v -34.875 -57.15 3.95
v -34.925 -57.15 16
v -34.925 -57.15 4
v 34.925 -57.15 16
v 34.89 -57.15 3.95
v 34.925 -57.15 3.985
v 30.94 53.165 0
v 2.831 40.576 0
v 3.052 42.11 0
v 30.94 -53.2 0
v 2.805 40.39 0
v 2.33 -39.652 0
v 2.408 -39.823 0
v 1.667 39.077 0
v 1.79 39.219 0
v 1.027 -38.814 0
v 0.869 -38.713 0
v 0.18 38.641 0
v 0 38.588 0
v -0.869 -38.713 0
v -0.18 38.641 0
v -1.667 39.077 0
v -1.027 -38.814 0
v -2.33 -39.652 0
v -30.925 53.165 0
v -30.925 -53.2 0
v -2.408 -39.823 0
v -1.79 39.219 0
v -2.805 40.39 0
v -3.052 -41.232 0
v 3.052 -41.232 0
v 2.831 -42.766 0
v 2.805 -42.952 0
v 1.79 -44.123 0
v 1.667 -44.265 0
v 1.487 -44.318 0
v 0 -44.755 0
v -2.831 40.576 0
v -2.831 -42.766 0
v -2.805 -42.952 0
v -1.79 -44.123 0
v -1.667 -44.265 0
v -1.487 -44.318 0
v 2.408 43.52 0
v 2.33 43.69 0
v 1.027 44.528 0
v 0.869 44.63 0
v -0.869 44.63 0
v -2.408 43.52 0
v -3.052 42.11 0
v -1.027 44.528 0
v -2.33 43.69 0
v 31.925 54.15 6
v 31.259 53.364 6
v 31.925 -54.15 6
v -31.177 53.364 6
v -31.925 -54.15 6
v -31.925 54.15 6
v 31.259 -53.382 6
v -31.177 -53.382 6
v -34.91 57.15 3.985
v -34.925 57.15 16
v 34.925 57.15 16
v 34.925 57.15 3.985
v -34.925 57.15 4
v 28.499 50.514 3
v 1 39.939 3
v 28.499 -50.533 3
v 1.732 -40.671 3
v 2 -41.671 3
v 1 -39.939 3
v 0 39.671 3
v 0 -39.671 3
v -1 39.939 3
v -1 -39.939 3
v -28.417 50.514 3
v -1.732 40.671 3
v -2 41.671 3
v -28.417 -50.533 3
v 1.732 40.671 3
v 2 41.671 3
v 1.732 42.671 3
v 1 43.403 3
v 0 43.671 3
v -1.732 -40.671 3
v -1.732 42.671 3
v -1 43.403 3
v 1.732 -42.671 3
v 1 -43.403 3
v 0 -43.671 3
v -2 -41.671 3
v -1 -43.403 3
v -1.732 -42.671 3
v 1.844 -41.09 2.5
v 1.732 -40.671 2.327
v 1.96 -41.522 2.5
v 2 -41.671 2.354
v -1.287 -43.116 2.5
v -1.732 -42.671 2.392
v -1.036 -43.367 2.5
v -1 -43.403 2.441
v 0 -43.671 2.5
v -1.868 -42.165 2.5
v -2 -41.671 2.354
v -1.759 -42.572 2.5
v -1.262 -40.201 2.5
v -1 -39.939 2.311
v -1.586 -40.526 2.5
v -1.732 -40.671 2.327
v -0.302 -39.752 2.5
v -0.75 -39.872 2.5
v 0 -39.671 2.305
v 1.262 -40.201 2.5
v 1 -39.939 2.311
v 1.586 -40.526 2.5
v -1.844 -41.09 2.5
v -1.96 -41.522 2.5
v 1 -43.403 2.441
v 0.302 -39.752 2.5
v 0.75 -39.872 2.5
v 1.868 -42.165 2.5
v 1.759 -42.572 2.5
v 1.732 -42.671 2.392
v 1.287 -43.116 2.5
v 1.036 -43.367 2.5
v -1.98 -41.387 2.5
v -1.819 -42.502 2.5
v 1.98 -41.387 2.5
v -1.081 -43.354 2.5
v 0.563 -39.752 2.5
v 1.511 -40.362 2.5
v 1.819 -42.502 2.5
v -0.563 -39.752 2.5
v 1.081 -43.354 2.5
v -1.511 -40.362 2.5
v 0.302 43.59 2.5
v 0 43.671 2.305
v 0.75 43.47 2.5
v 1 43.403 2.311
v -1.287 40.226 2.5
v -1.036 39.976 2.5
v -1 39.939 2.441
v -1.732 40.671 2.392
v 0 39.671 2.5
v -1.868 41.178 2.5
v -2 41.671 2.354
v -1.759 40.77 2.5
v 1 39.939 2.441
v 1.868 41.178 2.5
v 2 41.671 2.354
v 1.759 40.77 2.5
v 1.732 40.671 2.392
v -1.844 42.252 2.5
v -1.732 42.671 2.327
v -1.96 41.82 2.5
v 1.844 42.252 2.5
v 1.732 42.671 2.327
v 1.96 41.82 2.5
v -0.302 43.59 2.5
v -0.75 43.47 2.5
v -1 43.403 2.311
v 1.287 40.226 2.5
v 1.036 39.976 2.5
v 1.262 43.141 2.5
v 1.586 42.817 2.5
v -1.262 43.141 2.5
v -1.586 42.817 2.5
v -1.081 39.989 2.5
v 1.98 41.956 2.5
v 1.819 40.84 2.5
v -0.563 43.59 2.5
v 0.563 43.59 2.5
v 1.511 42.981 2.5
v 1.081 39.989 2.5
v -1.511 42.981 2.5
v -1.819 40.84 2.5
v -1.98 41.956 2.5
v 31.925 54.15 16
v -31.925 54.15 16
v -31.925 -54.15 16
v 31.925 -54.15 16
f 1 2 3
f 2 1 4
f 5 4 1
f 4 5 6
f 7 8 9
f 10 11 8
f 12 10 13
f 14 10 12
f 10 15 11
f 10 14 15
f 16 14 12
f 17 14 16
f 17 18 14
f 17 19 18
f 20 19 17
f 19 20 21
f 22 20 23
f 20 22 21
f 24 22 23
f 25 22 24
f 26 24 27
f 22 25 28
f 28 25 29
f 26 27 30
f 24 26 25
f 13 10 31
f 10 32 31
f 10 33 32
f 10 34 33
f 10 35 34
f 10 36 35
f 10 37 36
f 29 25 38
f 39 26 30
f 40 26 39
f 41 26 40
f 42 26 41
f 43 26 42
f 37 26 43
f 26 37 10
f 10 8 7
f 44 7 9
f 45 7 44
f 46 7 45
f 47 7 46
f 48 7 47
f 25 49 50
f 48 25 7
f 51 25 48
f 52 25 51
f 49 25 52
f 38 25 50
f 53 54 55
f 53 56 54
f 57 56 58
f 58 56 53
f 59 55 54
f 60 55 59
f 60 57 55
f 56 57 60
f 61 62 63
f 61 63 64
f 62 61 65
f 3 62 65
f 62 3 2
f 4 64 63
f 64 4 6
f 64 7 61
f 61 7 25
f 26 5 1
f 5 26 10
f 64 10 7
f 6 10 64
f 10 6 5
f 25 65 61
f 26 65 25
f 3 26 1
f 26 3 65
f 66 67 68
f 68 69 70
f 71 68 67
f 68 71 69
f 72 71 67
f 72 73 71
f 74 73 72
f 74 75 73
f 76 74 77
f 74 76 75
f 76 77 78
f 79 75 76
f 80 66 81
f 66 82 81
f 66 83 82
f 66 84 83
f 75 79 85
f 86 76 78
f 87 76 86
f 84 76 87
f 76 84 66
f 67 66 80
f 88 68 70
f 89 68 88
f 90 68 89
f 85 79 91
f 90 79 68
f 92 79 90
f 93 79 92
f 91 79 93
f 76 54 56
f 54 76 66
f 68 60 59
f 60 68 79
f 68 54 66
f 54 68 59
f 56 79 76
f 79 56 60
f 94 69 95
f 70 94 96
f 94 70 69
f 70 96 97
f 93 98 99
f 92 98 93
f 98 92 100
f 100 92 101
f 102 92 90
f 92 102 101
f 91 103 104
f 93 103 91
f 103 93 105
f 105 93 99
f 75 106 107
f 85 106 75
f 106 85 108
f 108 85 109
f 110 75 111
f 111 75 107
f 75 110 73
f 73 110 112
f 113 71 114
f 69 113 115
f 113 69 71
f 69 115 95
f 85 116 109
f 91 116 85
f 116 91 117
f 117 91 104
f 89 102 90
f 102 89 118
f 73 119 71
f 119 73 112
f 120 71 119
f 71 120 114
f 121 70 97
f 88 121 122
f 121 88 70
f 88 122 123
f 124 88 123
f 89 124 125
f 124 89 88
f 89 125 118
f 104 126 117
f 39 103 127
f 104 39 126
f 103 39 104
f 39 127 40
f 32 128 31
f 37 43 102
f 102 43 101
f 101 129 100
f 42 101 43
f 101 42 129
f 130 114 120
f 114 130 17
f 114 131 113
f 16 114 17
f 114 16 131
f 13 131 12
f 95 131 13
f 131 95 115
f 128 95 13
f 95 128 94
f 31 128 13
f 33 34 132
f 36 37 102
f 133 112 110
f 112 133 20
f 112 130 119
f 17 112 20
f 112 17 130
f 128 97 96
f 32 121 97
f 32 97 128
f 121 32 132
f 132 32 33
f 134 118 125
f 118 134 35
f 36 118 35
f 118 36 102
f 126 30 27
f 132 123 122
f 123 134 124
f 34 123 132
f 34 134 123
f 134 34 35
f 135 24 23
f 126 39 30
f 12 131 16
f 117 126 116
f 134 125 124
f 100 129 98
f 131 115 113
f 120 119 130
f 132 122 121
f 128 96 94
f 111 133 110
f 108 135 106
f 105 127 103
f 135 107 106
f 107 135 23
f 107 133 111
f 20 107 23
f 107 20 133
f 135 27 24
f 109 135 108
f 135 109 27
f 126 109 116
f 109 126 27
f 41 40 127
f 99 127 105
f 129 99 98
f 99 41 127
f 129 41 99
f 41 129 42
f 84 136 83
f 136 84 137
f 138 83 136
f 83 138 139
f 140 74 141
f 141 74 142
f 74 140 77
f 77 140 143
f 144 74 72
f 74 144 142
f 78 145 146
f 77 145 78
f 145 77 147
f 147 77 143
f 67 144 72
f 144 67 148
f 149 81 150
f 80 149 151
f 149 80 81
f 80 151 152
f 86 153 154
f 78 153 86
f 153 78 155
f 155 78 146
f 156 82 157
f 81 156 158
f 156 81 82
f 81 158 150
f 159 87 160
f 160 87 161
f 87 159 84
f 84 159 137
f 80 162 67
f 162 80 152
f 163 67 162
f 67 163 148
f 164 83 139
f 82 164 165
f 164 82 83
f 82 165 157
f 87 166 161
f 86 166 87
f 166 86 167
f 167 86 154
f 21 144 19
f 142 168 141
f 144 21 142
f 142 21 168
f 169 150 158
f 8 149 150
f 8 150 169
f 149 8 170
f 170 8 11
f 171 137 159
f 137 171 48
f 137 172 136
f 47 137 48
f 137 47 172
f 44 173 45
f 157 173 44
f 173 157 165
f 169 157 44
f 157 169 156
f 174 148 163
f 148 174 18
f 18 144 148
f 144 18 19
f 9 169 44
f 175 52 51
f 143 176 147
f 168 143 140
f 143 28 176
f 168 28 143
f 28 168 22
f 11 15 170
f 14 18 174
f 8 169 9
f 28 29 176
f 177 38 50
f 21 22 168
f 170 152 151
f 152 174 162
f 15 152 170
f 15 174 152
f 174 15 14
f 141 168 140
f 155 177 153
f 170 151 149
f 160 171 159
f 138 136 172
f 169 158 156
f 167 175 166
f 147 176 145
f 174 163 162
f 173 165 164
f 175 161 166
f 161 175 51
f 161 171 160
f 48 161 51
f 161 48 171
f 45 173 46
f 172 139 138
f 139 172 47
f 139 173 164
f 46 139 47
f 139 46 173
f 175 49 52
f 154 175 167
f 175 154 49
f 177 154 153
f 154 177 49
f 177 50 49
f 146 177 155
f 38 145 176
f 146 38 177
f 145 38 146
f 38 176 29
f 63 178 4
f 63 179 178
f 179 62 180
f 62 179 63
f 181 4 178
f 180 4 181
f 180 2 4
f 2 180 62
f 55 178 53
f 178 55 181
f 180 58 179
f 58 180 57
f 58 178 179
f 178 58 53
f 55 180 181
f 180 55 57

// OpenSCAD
// [FL_INDEX: keywords="openscad, 3d_parametric, Wally_with_extra_depth, csg_solid" | COT="Parametric OpenSCAD design from 3DCodeverse"]
// Title: Wally with extra depth

// WALLY - Wall Plate Customizer v1.3
// by TheNewHobbyist 2013 (http://thenewhobbyist.com)
// http://www.thingiverse.com/thing:47956
//
// Most of the connectors used with this thing are panel mount connectors from
// www.DataPro.net I can't vouch for their quality but they did have easy to
// find dimensions for their products so I used them.
//
// This could be tightened up considerably but I thought I'd get it out there for people
// to experiment with before I lose my mind staring at it too long. Also this is my
// first OpenSCAD model so cut me some slack ;)
//
//   Notes:
//
// * The plug types "Duplex Outlet", "Long_Toggle Switch", "Toggle Switch", and "Rocker"
//   will all use the entire plate when selected in top or bottom configuration. The
//   other selection (if not "none" will be selected.
//
// * "None" and "Blank should not be considered equal. if "None" is selected for one of
//   the two holes on a plate the other selection will be centered on that plate. If
//   "Blank" is selected that plug location will remain blank but the other selection
//   will NOT move into a centered position.
//
//	Change Log:
//
//	v1.1
//	UPDATED: Screw hole locations for designer and toggle plate types.
//	UPDATED: Hole size for designer plate type.
//	UPDATED: Outlet hole spacing
//
//	v1.2
//	ADDED: Long Toggle Switch for laird
//
//	v1.3
//	ADDED: 3 new sizes for plate export: Standard, Junior-Jumbo, and Jumbo.
//

  //////////////////////////
 // Customizer Settings: //
//////////////////////////

//How big are we talkin' here?
plate_width = 1; //	[1:5]

// Bigger hole in your wall? Try this
plate_size = 0; // [0:Standard, 1:Junior-Jumbo, 2:Jumbo]

//Pick a plug or full plate type
1st_plate = "none";  //	["none":None, "blank":Blank Port, "toggle":Full Plate - Toggle Switch, "long_toggle":Full Plate - Long Toggle Switch, "outlet":Full Plate - Duplex Outlet, "rocker":Full Plate - Rocker/Designer Plate, "keystone1":Keystone Jack, "vga":VGA Port, "hdmi":HDMI Port, "dvi":DVI-I Port, "displayport":Displayport, "cat5e":Cat5e/Cat6 Port, "usb-a":USB-A Port, "usb-b":USB-B Port, "firewire":Firewire IEEE 1394 Port, "db09":DB-09 Port, "ps2":PS2 Port, "f-type": F-Type/Coaxial Port,"svideo":S-Video Port, "stereo":Stereo Headphone Jack]
//Pick a bottom plug type or leave as none
1st_plate_bottom_hole = "none";  //	["none":None, "blank":Blank Port, "keystone1":Keystone Jack, "vga":VGA Port, "hdmi":HDMI Port, "dvi":DVI-I Port, "displayport":Displayport, "cat5e":Cat5e/Cat6 Port, "usb-a":USB-A Port, "usb-b":USB-B Port, "firewire":Firewire IEEE 1394 Port, "db09":DB-09 Port, "ps2":PS2 Port, "f-type": F-Type/Coaxial Port,"svideo":S-Video Port, "stereo":Stereo Headphone Jack]
//Pick a plug or full plate type
2nd_plate = "none";  //	["none":None, "blank":Blank Port, "toggle":Full Plate - Toggle Switch, "long_toggle":Full Plate - Long Toggle Switch, "outlet":Full Plate - Duplex Outlet, "rocker":Full Plate - Rocker/Designer Plate, "keystone1":Keystone Jack, "vga":VGA Port, "hdmi":HDMI Port, "dvi":DVI-I Port, "displayport":Displayport, "cat5e":Cat5e/Cat6 Port, "usb-a":USB-A Port, "usb-b":USB-B Port, "firewire":Firewire IEEE 1394 Port, "db09":DB-09 Port, "ps2":PS2 Port, "f-type": F-Type/Coaxial Port,"svideo":S-Video Port, "stereo":Stereo Headphone Jack]
//Pick a bottom plug type or leave as none
2nd_plate_bottom_hole = "none";  //	["none":None, "blank":Blank Port, "keystone1":Keystone Jack, "vga":VGA Port, "hdmi":HDMI Port, "dvi":DVI-I Port, "displayport":Displayport, "cat5e":Cat5e/Cat6 Port, "usb-a":USB-A Port, "usb-b":USB-B Port, "firewire":Firewire IEEE 1394 Port, "db09":DB-09 Port, "ps2":PS2 Port, "f-type": F-Type/Coaxial Port,"svideo":S-Video Port, "stereo":Stereo Headphone Jack]
//Pick a plug or full plate type
3rd_plate = "none";  //	["none":None, "blank":Blank Port, "toggle":Full Plate - Toggle Switch, "long_toggle":Full Plate - Long Toggle Switch, "outlet":Full Plate - Duplex Outlet, "rocker":Full Plate - Rocker/Designer Plate, "keystone1":Keystone Jack, "vga":VGA Port, "hdmi":HDMI Port, "dvi":DVI-I Port, "displayport":Displayport, "cat5e":Cat5e/Cat6 Port, "usb-a":USB-A Port, "usb-b":USB-B Port, "firewire":Firewire IEEE 1394 Port, "db09":DB-09 Port, "ps2":PS2 Port, "f-type": F-Type/Coaxial Port,"svideo":S-Video Port, "stereo":Stereo Headphone Jack]
//Pick a bottom plug type or leave as none
3rd_plate_bottom_hole = "none";  //	["none":None, "blank":Blank Port, "keystone1":Keystone Jack, "vga":VGA Port, "hdmi":HDMI Port, "dvi":DVI-I Port, "displayport":Displayport, "cat5e":Cat5e/Cat6 Port, "usb-a":USB-A Port, "usb-b":USB-B Port, "firewire":Firewire IEEE 1394 Port, "db09":DB-09 Port, "ps2":PS2 Port, "f-type": F-Type/Coaxial Port,"svideo":S-Video Port, "stereo":Stereo Headphone Jack]
//Pick a plug or full plate type
4th_plate = "none";  //["none":None, "blank":Blank Port, "toggle":Full Plate - Toggle Switch, "long_toggle":Full Plate - Long Toggle Switch, "outlet":Full Plate - Duplex Outlet, "rocker":Full Plate - Rocker/Designer Plate, "keystone1":Keystone Jack, "vga":VGA Port, "hdmi":HDMI Port, "dvi":DVI-I Port, "displayport":Displayport, "cat5e":Cat5e/Cat6 Port, "usb-a":USB-A Port, "usb-b":USB-B Port, "firewire":Firewire IEEE 1394 Port, "db09":DB-09 Port, "ps2":PS2 Port, "f-type": F-Type/Coaxial Port,"svideo":S-Video Port, "stereo":Stereo Headphone Jack]
//Pick a bottom plug type or leave as none
4th_plate_bottom_hole = "none";  //	["none":None, "blank":Blank Port, "keystone1":Keystone Jack, "vga":VGA Port, "hdmi":HDMI Port, "dvi":DVI-I Port, "displayport":Displayport, "cat5e":Cat5e/Cat6 Port, "usb-a":USB-A Port, "usb-b":USB-B Port, "firewire":Firewire IEEE 1394 Port, "db09":DB-09 Port, "ps2":PS2 Port, "f-type": F-Type/Coaxial Port,"svideo":S-Video Port, "stereo":Stereo Headphone Jack]
//Pick a plug or full plate type
5th_plate = "none";  //["none":None, "blank":Blank Port, "toggle":Full Plate - Toggle Switch, "long_toggle":Full Plate - Long Toggle Switch, "outlet":Full Plate - Duplex Outlet, "rocker":Full Plate - Rocker/Designer Plate, "keystone1":Keystone Jack, "vga":VGA Port, "hdmi":HDMI Port, "dvi":DVI-I Port, "displayport":Displayport, "cat5e":Cat5e/Cat6 Port, "usb-a":USB-A Port, "usb-b":USB-B Port, "firewire":Firewire IEEE 1394 Port, "db09":DB-09 Port, "ps2":PS2 Port, "f-type": F-Type/Coaxial Port,"svideo":S-Video Port, "stereo":Stereo Headphone Jack]
//Pick a bottom plug type or leave as none
5th_plate_bottom_hole = "none";  //	["none":None, "blank":Blank Port, "keystone1":Keystone Jack, "vga":VGA Port, "hdmi":HDMI Port, "dvi":DVI-I Port, "displayport":Displayport, "cat5e":Cat5e/Cat6 Port, "usb-a":USB-A Port, "usb-b":USB-B Port, "firewire":Firewire IEEE 1394 Port, "db09":DB-09 Port, "ps2":PS2 Port, "f-type": F-Type/Coaxial Port,"svideo":S-Video Port, "stereo":Stereo Headphone Jack]

//Extra Amount that plate extends from wall (useful for shallow boxes)
plate_sticks_out = 10; // [0-40]
//Wall thickness for plate extension
sticks_out_thick = 3; // [2-4]

  //////////////////////
 // Static Settings: //
//////////////////////

module GoAwayCustomizer() {
// This module is here to stop Customizer from picking up the variables below
}

l_offset = [34.925,39.6875,44.45];
r_offset = [34.925,39.6875,44.45];
spacer = [0,0,46.0375,92.075,138.1125,184.15];
solid_plate_width = l_offset[plate_size] + spacer[plate_width] + r_offset[plate_size];

height_sizes = [114.3,123.825,133.35];

height = 114.3; //plate height (static)
gang_width=[0,69.86,115.824,161.925,206.375,254]; // Plate widths (standard)

edgewidth = solid_plate_width + 10; // Bevel setting for top and bottom
rightbevel = solid_plate_width - 4; // Bevel for right side (scales)

left_offset = 34.925; // Offset first hole position
switch_offset = 46.0375; // Offset all additional holes
thinner_offset=[0,0.92,0.95,0.96,0.97,0.973]; // Manual fix for right side wackiness

positions=[height_sizes[plate_size]/2,height_sizes[plate_size]/2 - 14.25,height_sizes[plate_size]/2 + 14.25];

// preview[view:north, tilt:bottom]


  ///////////////////
 // Hole Control: //
///////////////////

module plate1(){
	if (1st_plate == "toggle" || 1st_plate_bottom_hole == "toggle"){
		translate([0,l_offset[plate_size],0]) toggle_screws();
		translate([0,l_offset[plate_size],0]) hole("toggle");
		}
	else if (1st_plate == "long_toggle" || 1st_plate_bottom_hole == "long_toggle"){
		translate([0,l_offset[plate_size],0]) toggle_screws();
		translate([0,l_offset[plate_size],0]) hole("long_toggle");
		}
	else if (1st_plate == "rocker" || 1st_plate_bottom_hole == "rocker"){
		translate([0,l_offset[plate_size],0]) rocker_screws();
		translate([0,l_offset[plate_size],0]) hole("rocker");
		}
	else if (1st_plate == "outlet" || 1st_plate_bottom_hole == "outlet") {
	translate([0,l_offset[plate_size],0]) hole("outlet");
	}
	else if (1st_plate_bottom_hole == "none") {
		translate([0,l_offset[plate_size],0]) box_screws();
		translate([positions[0],l_offset[plate_size],0]) hole(1st_plate);
			}
	else if (1st_plate == "none") {
		translate([0,l_offset[plate_size],0]) box_screws();
		translate([positions[0],l_offset[plate_size],0]) hole(1st_plate_bottom_hole);
			}
	else {
	translate([0,l_offset[plate_size],0]) box_screws();
	translate([positions[1],l_offset[plate_size],0]) hole(1st_plate);
	translate([positions[2],l_offset[plate_size],0]) hole(1st_plate_bottom_hole);
	}
}

module plate2(){
	if (2nd_plate == "toggle" || 2nd_plate_bottom_hole == "toggle"){
		translate([0,l_offset[plate_size] + switch_offset,0]) toggle_screws();
		translate([0,l_offset[plate_size] + switch_offset,0]) hole("toggle");
		}
	else if (2nd_plate == "long_toggle" || 2nd_plate_bottom_hole == "long_toggle"){
		translate([0,l_offset[plate_size] + switch_offset,0]) toggle_screws();
		translate([0,l_offset[plate_size] + switch_offset,0]) hole("long_toggle");
		}
	else if (2nd_plate == "rocker" || 2nd_plate_bottom_hole == "rocker"){
		translate([0,l_offset[plate_size] + switch_offset,0]) rocker_screws();
		translate([0,l_offset[plate_size] + switch_offset,0]) hole("rocker");
		}
	else if (2nd_plate == "outlet" || 2nd_plate_bottom_hole == "outlet") {
	translate([0,l_offset[plate_size] + switch_offset,0]) hole("outlet");
	}
	else if (2nd_plate_bottom_hole == "none") {
		translate([0,l_offset[plate_size] + switch_offset,0]) box_screws();
		translate([positions[0],l_offset[plate_size] + switch_offset,0]) hole(2nd_plate);
			}
	else if (2nd_plate == "none") {
		translate([0,l_offset[plate_size] + switch_offset,0]) box_screws();
		translate([positions[0],l_offset[plate_size] + switch_offset,0]) hole(2nd_plate_bottom_hole);
			}
	else {
	translate([0,l_offset[plate_size] + switch_offset,0]) box_screws();
	translate([positions[1],l_offset[plate_size] + switch_offset,0]) hole(2nd_plate);
	translate([positions[2],l_offset[plate_size] + switch_offset,0]) hole(2nd_plate_bottom_hole);
	}
}

module plate3(){
	if (3rd_plate == "toggle" || 3rd_plate_bottom_hole == "toggle"){
		translate([0,l_offset[plate_size] + switch_offset * 2,0]) toggle_screws();
		translate([0,l_offset[plate_size] + switch_offset * 2,0]) hole("toggle");
		}
	else if (3rd_plate == "long_toggle" || 3rd_plate_bottom_hole == "long_toggle"){
		translate([0,l_offset[plate_size] + switch_offset * 2,0]) toggle_screws();
		translate([0,l_offset[plate_size] + switch_offset * 2,0]) hole("long_toggle");
		}
	else if (3rd_plate == "rocker" || 3rd_plate_bottom_hole == "rocker"){
		translate([0,l_offset[plate_size] + switch_offset * 2,0]) rocker_screws();
		translate([0,l_offset[plate_size] + switch_offset * 2,0]) hole("rocker");
		}
	else if (3rd_plate == "outlet" || 3rd_plate_bottom_hole == "outlet") {
	translate([0,l_offset[plate_size] + switch_offset * 2,0]) hole("outlet");
	}
	else if (3rd_plate_bottom_hole == "none") {
		translate([0,l_offset[plate_size] + switch_offset * 2,0]) box_screws();
		translate([positions[0],l_offset[plate_size] + switch_offset * 2,0]) hole(3rd_plate);
			}
	else if (3rd_plate == "none") {
		translate([0,l_offset[plate_size] + switch_offset * 2,0]) box_screws();
		translate([positions[0],l_offset[plate_size] + switch_offset * 2,0]) hole(3rd_plate_bottom_hole);
			}
	else {
	translate([0,l_offset[plate_size] + switch_offset * 2,0]) box_screws();
	translate([positions[1],l_offset[plate_size] + switch_offset * 2,0]) hole(3rd_plate);
	translate([positions[2],l_offset[plate_size] + switch_offset * 2,0]) hole(3rd_plate_bottom_hole);
	}
}

module plate4(){
	if (4th_plate == "toggle" || 4th_plate_bottom_hole == "toggle"){
		translate([0,l_offset[plate_size] + switch_offset * 3,0]) toggle_screws();
		translate([0,l_offset[plate_size] + switch_offset * 3,0]) hole("toggle");
		}
	else if (4th_plate == "long_toggle" || 4th_plate_bottom_hole == "long_toggle"){
		translate([0,l_offset[plate_size] + switch_offset * 3,0]) toggle_screws();
		translate([0,l_offset[plate_size] + switch_offset * 3,0]) hole("long_toggle");
		}
	else if (4th_plate == "rocker" || 4th_plate_bottom_hole == "rocker"){
		translate([0,l_offset[plate_size] + switch_offset * 3,0]) rocker_screws();
		translate([0,l_offset[plate_size] + switch_offset * 3,0]) hole("rocker");
		}
	else if (4th_plate == "outlet" || 4th_plate_bottom_hole == "outlet") {
	translate([0,l_offset[plate_size] + switch_offset * 3,0]) hole("outlet");
	}
	else if (4th_plate_bottom_hole == "none") {
		translate([0,l_offset[plate_size] + switch_offset * 3,0]) box_screws();
		translate([positions[0],l_offset[plate_size] + switch_offset * 3,0]) hole(4th_plate);
			}
	else if (4th_plate == "none") {
		translate([0,l_offset[plate_size] + switch_offset * 3,0]) box_screws();
		translate([positions[0],l_offset[plate_size] + switch_offset * 3,0]) hole(4th_plate_bottom_hole);
			}
	else {
	translate([0,l_offset[plate_size] + switch_offset * 3,0]) box_screws();
	translate([positions[1],l_offset[plate_size] + switch_offset * 3,0]) hole(4th_plate);
	translate([positions[2],l_offset[plate_size] + switch_offset * 3,0]) hole(4th_plate_bottom_hole);
	}
}

module plate5(){
	if (5th_plate == "toggle" || 5th_plate_bottom_hole == "toggle"){
		translate([0,l_offset[plate_size] + switch_offset * 4,0]) toggle_screws();
		translate([0,l_offset[plate_size] + switch_offset * 4,0]) hole("toggle");
		}
	else if (5th_plate == "long_toggle" || 5th_plate_bottom_hole == "long_toggle"){
		translate([0,l_offset[plate_size] + switch_offset * 4,0]) toggle_screws();
		translate([0,l_offset[plate_size] + switch_offset * 4,0]) hole("long_toggle");
		}
	else if (5th_plate == "rocker" || 5th_plate_bottom_hole == "rocker"){
		translate([0,l_offset[plate_size] + switch_offset * 4,0]) rocker_screws();
		translate([0,l_offset[plate_size] + switch_offset * 4,0]) hole("rocker");
		}
	else if (5th_plate == "outlet" || 5th_plate_bottom_hole == "outlet") {
	translate([0,l_offset[plate_size] + switch_offset * 4,0]) hole("outlet");
	}
	else if (5th_plate_bottom_hole == "none") {
		translate([0,l_offset[plate_size] + switch_offset * 4,0]) box_screws();
		translate([positions[0],l_offset[plate_size] + switch_offset * 4,0]) hole(5th_plate);
			}
	else if (5th_plate == "none") {
		translate([0,l_offset[plate_size] + switch_offset * 4,0]) box_screws();
		translate([positions[0],l_offset[plate_size] + switch_offset * 4,0]) hole(5th_plate_bottom_hole);
			}
	else {
	translate([0,l_offset[plate_size] + switch_offset * 4,0]) box_screws();
	translate([positions[1],l_offset[plate_size] + switch_offset * 4,0]) hole(5th_plate);
	translate([positions[2],l_offset[plate_size] + switch_offset * 4,0]) hole(5th_plate_bottom_hole);
	}
}

  /////////////////
 // SolidWorks: //
/////////////////

module extend_box() { union () {
	translate([0,0,-plate_sticks_out]) cube([height_sizes[plate_size],sticks_out_thick,plate_sticks_out]);
	translate([0,solid_plate_width-sticks_out_thick,-plate_sticks_out]) cube([height_sizes[plate_size],sticks_out_thick,plate_sticks_out]);
	translate([0,0,-plate_sticks_out]) cube([sticks_out_thick,solid_plate_width,plate_sticks_out]);
	translate([height_sizes[plate_size]-sticks_out_thick,0,-plate_sticks_out]) cube([sticks_out_thick,solid_plate_width,plate_sticks_out]);
    }
}
	    
	    module plate1_solid(){
if (1st_plate == "keystone1" && 1st_plate_bottom_hole == "none") {
	translate([height_sizes[plate_size]/2 + 14.3,l_offset[plate_size] - 11.5,-3.9]) hole("keystone_solid");
	}
else if (1st_plate == "keystone1" && 1st_plate_bottom_hole != "outlet" && 1st_plate_bottom_hole != "toggle" && 1st_plate_bottom_hole != "rocker") {
	translate([height_sizes[plate_size]/2,l_offset[plate_size] - 11.5,-3.9]) hole("keystone_solid");
	}
if (1st_plate_bottom_hole == "keystone1" && 1st_plate == "none") {
	translate([height_sizes[plate_size]/2 + 14.3,l_offset[plate_size] - 11.5,-3.9]) hole("keystone_solid");
	}
else if (1st_plate_bottom_hole == "keystone1" && 1st_plate != "outlet" && 1st_plate != "toggle" && 1st_plate != "rocker") {
	translate([height_sizes[plate_size]/2 + 28.5,l_offset[plate_size] - 11.5,-3.9]) hole("keystone_solid");
	}

}

module plate2_solid(){
if (2nd_plate == "keystone1" && 2nd_plate_bottom_hole == "none") {
	translate([height_sizes[plate_size]/2 + 14.3,l_offset[plate_size] - 11.5 + switch_offset,-3.9]) hole("keystone_solid");
	}
else if (2nd_plate == "keystone1" && 2nd_plate_bottom_hole != "outlet" && 2nd_plate_bottom_hole != "toggle" && 2nd_plate_bottom_hole != "rocker") {
	translate([height_sizes[plate_size]/2,l_offset[plate_size] - 11.5 + switch_offset,-3.9]) hole("keystone_solid");
	}
if (2nd_plate_bottom_hole == "keystone1" && 2nd_plate == "none") {
	translate([height_sizes[plate_size]/2 + 14.3,l_offset[plate_size] - 11.5 + switch_offset,-3.9]) hole("keystone_solid");
	}
else if (2nd_plate_bottom_hole == "keystone1" && 2nd_plate != "outlet" && 2nd_plate != "toggle" && 2nd_plate != "rocker") {
	translate([height_sizes[plate_size]/2 + 28.5,l_offset[plate_size] - 11.5 + switch_offset,-3.9]) hole("keystone_solid");
	}

}

module plate3_solid(){
if (3rd_plate == "keystone1" && 3rd_plate_bottom_hole == "none") {
	translate([height_sizes[plate_size]/2 + 14.3,l_offset[plate_size] - 11.5 + switch_offset * 2,-3.9]) hole("keystone_solid");
	}
else if (3rd_plate == "keystone1" && 3rd_plate_bottom_hole != "outlet" && 3rd_plate_bottom_hole != "toggle" && 3rd_plate_bottom_hole != "rocker") {
	translate([height_sizes[plate_size]/2,l_offset[plate_size] - 11.5 + switch_offset * 2,-3.9]) hole("keystone_solid");
	}
if (3rd_plate_bottom_hole == "keystone1" && 3rd_plate == "none") {
	translate([height_sizes[plate_size]/2 + 14.3,l_offset[plate_size] - 11.5 + switch_offset * 2,-3.9]) hole("keystone_solid");
	}
else if (3rd_plate_bottom_hole == "keystone1" && 3rd_plate != "outlet" && 3rd_plate != "toggle" && 3rd_plate != "rocker") {
	translate([height_sizes[plate_size]/2 + 28.5,l_offset[plate_size] - 11.5 + switch_offset * 2,-3.9]) hole("keystone_solid");
	}

}

module plate4_solid(){
if (4th_plate == "keystone1" && 4th_plate_bottom_hole == "none") {
	translate([height_sizes[plate_size]/2 + 14.3,l_offset[plate_size] - 11.5 + switch_offset * 3,-3.9]) hole("keystone_solid");
	}
else if (4th_plate == "keystone1" && 4th_plate_bottom_hole != "outlet" && 4th_plate_bottom_hole != "toggle" && 4th_plate_bottom_hole != "rocker") {
	translate([height_sizes[plate_size]/2,l_offset[plate_size] - 11.5 + switch_offset * 3,-3.9]) hole("keystone_solid");
	}
if (4th_plate_bottom_hole == "keystone1" && 4th_plate == "none") {
	translate([height_sizes[plate_size]/2 + 14.3,l_offset[plate_size] - 11.5 + switch_offset * 3,-3.9]) hole("keystone_solid");
	}
else if (4th_plate_bottom_hole == "keystone1" && 4th_plate != "outlet" && 4th_plate != "toggle" && 4th_plate != "rocker") {
	translate([height_sizes[plate_size]/2 + 28.5,l_offset[plate_size] - 11.5 + switch_offset * 3,-3.9]) hole("keystone_solid");
	}

}

module plate5_solid(){
if (5th_plate == "keystone1" && 5th_plate_bottom_hole == "none") {
	translate([height_sizes[plate_size]/2 + 14.3,l_offset[plate_size] - 11.5 + switch_offset * 4,-3.9]) hole("keystone_solid");
	}
else if (5th_plate == "keystone1" && 5th_plate_bottom_hole != "outlet" && 5th_plate_bottom_hole != "toggle" && 5th_plate_bottom_hole != "rocker") {
	translate([height_sizes[plate_size]/2,l_offset[plate_size] - 11.5 + switch_offset * 4,-3.9]) hole("keystone_solid");
	}
if (5th_plate_bottom_hole == "keystone1" && 5th_plate == "none") {
	translate([height_sizes[plate_size]/2 + 14.3,l_offset[plate_size] - 11.5 + switch_offset * 4,-3.9]) hole("keystone_solid");
	}
else if (5th_plate_bottom_hole == "keystone1" && 5th_plate != "outlet" && 5th_plate != "toggle" && 5th_plate != "rocker") {
	translate([height_sizes[plate_size]/2 + 28.5,l_offset[plate_size] - 11.5 + switch_offset * 4,-3.9]) hole("keystone_solid");
	}

}

  ///////////////////
 // PlateStation: //
///////////////////

//Plate size and bevel
module plate() {
    union () {
	difference() {
		cube([height_sizes[plate_size],solid_plate_width,6]);
		translate([-4.3,-5,6.2]) rotate([0,45,0]) cube([6,edgewidth,6]); //Top Bevel
		translate([height_sizes[plate_size]-4.2,-5,6.25]) rotate([0,45,0]) cube([6,edgewidth,6]); //Bottom Bevel
		translate([height_sizes[plate_size]+10,-4.4,6.1]) rotate([0,45,90]) cube([6,height_sizes[plate_size]+20,6]); //Left Bevel (doesn't change)
		translate([height_sizes[plate_size]+10,rightbevel,6]) rotate([0,45,90]) cube([6,height_sizes[plate_size]+10,6]); //Right Bevel (scales right)
	    }
	}
    }


// Thinning Plate
module plate_inner() {
	scale([0.95,thinner_offset[plate_width],1]){
	translate([3,3,0]){
	difference() {
		cube([height_sizes[plate_size],solid_plate_width,6]);
		translate([-4.3,-5,6.2]) rotate([0,45,0]) cube([6,edgewidth,6]); //Top Bevel
		translate([height_sizes[plate_size]-4.2,-5,6.25]) rotate([0,45,0]) cube([6,edgewidth,6]); //Bottom Bevel
		translate([height_sizes[plate_size]+10,-4.4,6.1]) rotate([0,45,90]) cube([6,height_sizes[plate_size]+20,6]); //Left Bevel (doesn't change)
		translate([height_sizes[plate_size]+10,rightbevel,6]) rotate([0,45,90]) cube([6,height_sizes[plate_size]+10,6]); //Right Bevel (scales right)
				}
			}
		}
	}

// Box screw holes
module box_screws(){
	 translate([height_sizes[plate_size]/2 + 41.67125,0,-1]) cylinder(r=2, h=10, $fn=12);
	 translate([height_sizes[plate_size]/2 + 41.67125,0,3.5]) cylinder(r1=2, r2=3.3, h=3);
	 translate([height_sizes[plate_size]/2 - 41.67125,0,-1]) cylinder(r=2, h=10, $fn=12);
	 translate([height_sizes[plate_size]/2 - 41.67125,0,3.5]) cylinder(r1=2, r2=3.3, h=3);
}

// Rocker/Designer screw holes
module rocker_screws(){
	 translate([height_sizes[plate_size]/2 + 48.41875,0,-1]) cylinder(r=2, h=10, $fn=12);
	 translate([height_sizes[plate_size]/2 + 48.41875,0,3.5]) cylinder(r1=2, r2=3.3, h=3);
	 translate([height_sizes[plate_size]/2 - 48.41875,0,-1]) cylinder(r=2, h=10, $fn=12);
	 translate([height_sizes[plate_size]/2 - 48.41875,0,3.5]) cylinder(r1=2, r2=3.3, h=3);
}

// Toggle screw holes
module toggle_screws(){
	 translate([height_sizes[plate_size]/2 + 30.1625,0,-1]) cylinder(r=2, h=10, $fn=12);
	 translate([height_sizes[plate_size]/2 + 30.1625,0,3.5]) cylinder(r1=2, r2=3.3, h=3);
	 translate([height_sizes[plate_size]/2 - 30.1625,0,-1]) cylinder(r=2, h=10, $fn=12);
	 translate([height_sizes[plate_size]/2 - 30.1625,0,3.5]) cylinder(r1=2, r2=3.3, h=3);
}

  ///////////////
 // Portland: //
///////////////

// Hole Cutout definitions
module hole(hole_type) {


// Toggle switch hole
	if (hole_type == "toggle") {
		translate([height_sizes[plate_size]/2,0,0]) cube([23.8125,10.3188,15], center = true);
		 						}

// Toggle switch hole and screw holes
	if (hole_type == "long_toggle") {
		translate([height_sizes[plate_size]/2,0,0]) cube([43.6563,11.9063,15], center = true);
		 						}

// Rocker switch plate
	if (hole_type == "rocker") {
		translate([height_sizes[plate_size]/2,0,0]) cube([67.1,33.3,15], center = true);

		 						}

// Duplex power outlet plate or dual side toggles
	if (hole_type == "outlet" || hole_type == "dualsidetoggle") {
		translate([height_sizes[plate_size]/2 + 19.3915,0,0]) {
			difference() {
				cylinder(r=17.4625, h=15, center = true);
				translate([-24.2875,-15,-2]) cube([10,37,15], center = false);
				translate([14.2875,-15,-2]) cube([10,37,15], center = false);
								}
							}
		translate([height_sizes[plate_size]/2 - 19.3915,0,0]){
			difference(){
				cylinder(r=17.4625, h=15, center = true);
				translate([-24.2875,-15,-2]) cube([10,37,15], center = false);
				translate([14.2875,-15,-2]) cube([10,37,15], center = false);
								}
							}
		translate([height_sizes[plate_size]/2,0,-1]) cylinder(r=2, h=10);
		translate([height_sizes[plate_size]/2,0,3.5]) cylinder(r1=2, r2=3.3, h=3);
							}

// Blank plate
	if (hole_type == "blank") { }

// VGA & DB09 plate
// VGA Fits http://www.datapro.net/products/vga-dual-panel-mount-f-f-cable.html
// DB09 Fits http://www.datapro.net/products/db9-serial-panel-mount-male-extension.html
	if (hole_type == "vga" || hole_type == "db09") {

			translate([0,-12.5,3]) cylinder(r=1.75, h=10, center = true);
			translate([0,12.5,3]) cylinder(r=1.75, h=10, center = true);
				difference(){
					cube([10,19,13], center=true);
					translate([-5,-9.2,1]) rotate([0,0,-35.6]) cube([4.4,2.4,15], center=true);
					translate([.9,-11.2,0]) rotate([0,0,9.6]) cube([10,4.8,15], center=true);
					translate([4.6,-8.5,0]) rotate([0,0,37.2]) cube([4.4,2.4,15], center=true);
					translate([-5,9.2,1]) rotate([0,0,35.6]) cube([4.4,2.4,15], center=true);
					translate([0.9,11.2,0]) rotate([0,0,-9.6]) cube([10,4.8,15], center=true);
					translate([4.6,8.5,0]) rotate([0,0,-37.2]) cube([4.4,2.4,15], center=true);
								}
						}

// HDMI plate
// Fits http://www.datapro.net/products/hdmi-panel-mount-extension-cable.html
	if (hole_type == "hdmi") {
		translate([0,-13,3]) cylinder(r=1.75, h=10, center = true);
		translate([0,13,3]) cylinder(r=1.75, h=10, center = true);
		translate([0,0,3]) cube([6,16,10], center=true);
							}

// DVI-I plate
// Fits http://www.datapro.net/products/dvi-i-panel-mount-extension-cable.html
	if (hole_type == "dvi") {
		translate([0,-16,3]) cylinder(r=1.75, h=10, center = true);
		translate([0,16,3]) cylinder(r=1.75, h=10, center = true);
		translate([0,0,3]) cube([10,26,10], center=true);
							}

// DisplayPort plate
// Fits http://www.datapro.net/products/dvi-i-panel-mount-extension-cable.html
	if (hole_type == "displayport") {
		translate([0,-13.5,3]) cylinder(r=1.75, h=10, center = true);
		translate([0,13.5,3]) cylinder(r=1.75, h=10, center = true);
		translate([0,0,0]){
			difference(){
				translate([0,0,3]) cube([7,19,10], center=true);
				translate([2.47,-9.37,3]) rotate([0,0,-54.6]) cube([3,5,14], center=true);
						}
								}
									}

// USB-A Plate
// Fits http://www.datapro.net/products/usb-panel-mount-type-a-cable.html
	if (hole_type == "usb-a") {
		translate([0,-15,3]) cylinder(r=1.75, h=10, center = true);
		translate([0,15,3]) cylinder(r=1.75, h=10, center = true);
		translate([0,0,3]) cube([8,16,10], center=true);
							}

// USB-B Plate
// Fits http://www.datapro.net/products/usb-panel-mount-type-b-cable.html
	if (hole_type == "usb-b") {
		translate([0,-13,3]) cylinder(r=1.75, h=10, center = true);
		translate([0,13,3]) cylinder(r=1.75, h=10, center = true);
		translate([0,0,3]) cube([11,12,10], center=true);
							}

// 1394 Firewire Plate
// Fits http://www.datapro.net/products/firewire-panel-mount-extension.html
	if (hole_type == "firewire") {
		translate([0,-13.5,3]) cylinder(r=1.75, h=10, center = true);
		translate([0,13.5,3]) cylinder(r=1.75, h=10, center = true);
		translate([0,0,3]) cube([7,12,10], center=true);
							}

// F-Type / Cable TV Plate
// Fits http://www.datapro.net/products/f-type-panel-mounting-coupler.html
	if (hole_type == "f-type") {
		translate([0,0,3]) cylinder(r=4.7625, h=10, center=true);
							}

// Cat5e & Gat6 plate
// Cat5e Fits http://www.datapro.net/products/cat-5e-panel-mount-ethernet.html
// Cat6 Fits hhttp://www.datapro.net/products/cat-6-panel-mount-ethernet.html
	if (hole_type == "cat5e" || hole_type == "cat6") {
		translate([0,-12.5,3]) cylinder(r=1.75, h=10, center = true);
		translate([0,12.5,3]) cylinder(r=1.75, h=10, center = true);
		translate([0,0,3]) cube([15,15,10], center=true);
		}

// S-Video & PS2 plate
// S-Video Fits hhttp://www.datapro.net/products/cat-6-panel-mount-ethernet.html
// PS2 http://www.datapro.net/products/ps2-panel-mount-extension-cable.html
	if (hole_type == "svideo" || hole_type == "ps2") {
		translate([0,-10,3]) cylinder(r=1.75, h=10, center = true);
		translate([0,10,3]) cylinder(r=1.75, h=10, center = true);
		translate([0,0,3]) cylinder(r=5, h=10, center=true);
		}


// Stereo / 1/4" headphone jack coupler
// Stereo coupler Fits http://www.datapro.net/products/stereo-panel-mount-coupler.html
	if (hole_type == "stereo") {
		translate([0,0,3]) cylinder(r=2.985, h=10, center=true);
		}

//Keystone1 hole
//Hole for 1 Keystone Jack
	if (hole_type == "keystone1") {
		translate([0,0,5]) cube([16.5,15,10], center = true);
	}

//Keystone Solid
	if (hole_type == "keystone_solid") {
		rotate([0,0,90]) {
			difference(){
				translate([0,0,.1]) cube([23,30.5,9.8]);
					translate([4,4,0]){
						difference(){
							cube([15,22.5,10]);
							translate([-1,-0.001,3.501]) cube([17,2,6.5]);
							translate([-1,2.5,-3.40970]) rotate([45,0,0]) cube([17,2,6.5]);
							translate([-1,18.501,6.001]) cube([17,4,4]);
							translate([-1,20.5,0]) rotate([-45,0,0]) cube([17,2,6.5]);
						}
					}
				}
			}
		}

//End of module "hole"
}

  ////////////////////////
 // Number One ENGAGE: //
////////////////////////

// Rotate so it sits correctly on plate (whoops) and make upside down
rotate([0,180,90]){
// put plate at 0,0,0 for easier printing
translate([-height_sizes[plate_size]/2,-solid_plate_width/2,-6]){

    union() {
    
if (plate_width == 1) {
	difference() {
		plate();
		translate([0,0,-3]) plate_inner();
		plate1();
			}
		union() {
		plate1_solid();
		}
	    }
else if (plate_width == 2) {
difference()
{
plate();
translate([0,0,-3]) plate_inner();
plate1();
plate2();
}
union() {
		plate1_solid();
		plate2_solid();
		}
}
else if (plate_width == 3) {
difference()
{
plate();
translate([0,0,-3]) plate_inner();
plate1();
plate2();
plate3();
}
union() {
		plate1_solid();
		plate2_solid();
		plate3_solid();
		}
}

else if (plate_width == 4) {
difference()
{
plate();
translate([0,0,-3]) plate_inner();
plate1();
plate2();
plate3();
plate4();
}
union() {
		plate1_solid();
		plate2_solid();
		plate3_solid();
		plate4_solid();
		}
}

else if (plate_width == 5) {
difference()
{
plate();
translate([0,0,-3]) plate_inner();
plate1();
plate2();
plate3();
plate4();
plate5();
}
union() {
		plate1_solid();
		plate2_solid();
		plate3_solid();
		plate4_solid();
		plate5_solid();
		}
}
extend_box();	

}

//End Rotate
}
//End Translate
}
